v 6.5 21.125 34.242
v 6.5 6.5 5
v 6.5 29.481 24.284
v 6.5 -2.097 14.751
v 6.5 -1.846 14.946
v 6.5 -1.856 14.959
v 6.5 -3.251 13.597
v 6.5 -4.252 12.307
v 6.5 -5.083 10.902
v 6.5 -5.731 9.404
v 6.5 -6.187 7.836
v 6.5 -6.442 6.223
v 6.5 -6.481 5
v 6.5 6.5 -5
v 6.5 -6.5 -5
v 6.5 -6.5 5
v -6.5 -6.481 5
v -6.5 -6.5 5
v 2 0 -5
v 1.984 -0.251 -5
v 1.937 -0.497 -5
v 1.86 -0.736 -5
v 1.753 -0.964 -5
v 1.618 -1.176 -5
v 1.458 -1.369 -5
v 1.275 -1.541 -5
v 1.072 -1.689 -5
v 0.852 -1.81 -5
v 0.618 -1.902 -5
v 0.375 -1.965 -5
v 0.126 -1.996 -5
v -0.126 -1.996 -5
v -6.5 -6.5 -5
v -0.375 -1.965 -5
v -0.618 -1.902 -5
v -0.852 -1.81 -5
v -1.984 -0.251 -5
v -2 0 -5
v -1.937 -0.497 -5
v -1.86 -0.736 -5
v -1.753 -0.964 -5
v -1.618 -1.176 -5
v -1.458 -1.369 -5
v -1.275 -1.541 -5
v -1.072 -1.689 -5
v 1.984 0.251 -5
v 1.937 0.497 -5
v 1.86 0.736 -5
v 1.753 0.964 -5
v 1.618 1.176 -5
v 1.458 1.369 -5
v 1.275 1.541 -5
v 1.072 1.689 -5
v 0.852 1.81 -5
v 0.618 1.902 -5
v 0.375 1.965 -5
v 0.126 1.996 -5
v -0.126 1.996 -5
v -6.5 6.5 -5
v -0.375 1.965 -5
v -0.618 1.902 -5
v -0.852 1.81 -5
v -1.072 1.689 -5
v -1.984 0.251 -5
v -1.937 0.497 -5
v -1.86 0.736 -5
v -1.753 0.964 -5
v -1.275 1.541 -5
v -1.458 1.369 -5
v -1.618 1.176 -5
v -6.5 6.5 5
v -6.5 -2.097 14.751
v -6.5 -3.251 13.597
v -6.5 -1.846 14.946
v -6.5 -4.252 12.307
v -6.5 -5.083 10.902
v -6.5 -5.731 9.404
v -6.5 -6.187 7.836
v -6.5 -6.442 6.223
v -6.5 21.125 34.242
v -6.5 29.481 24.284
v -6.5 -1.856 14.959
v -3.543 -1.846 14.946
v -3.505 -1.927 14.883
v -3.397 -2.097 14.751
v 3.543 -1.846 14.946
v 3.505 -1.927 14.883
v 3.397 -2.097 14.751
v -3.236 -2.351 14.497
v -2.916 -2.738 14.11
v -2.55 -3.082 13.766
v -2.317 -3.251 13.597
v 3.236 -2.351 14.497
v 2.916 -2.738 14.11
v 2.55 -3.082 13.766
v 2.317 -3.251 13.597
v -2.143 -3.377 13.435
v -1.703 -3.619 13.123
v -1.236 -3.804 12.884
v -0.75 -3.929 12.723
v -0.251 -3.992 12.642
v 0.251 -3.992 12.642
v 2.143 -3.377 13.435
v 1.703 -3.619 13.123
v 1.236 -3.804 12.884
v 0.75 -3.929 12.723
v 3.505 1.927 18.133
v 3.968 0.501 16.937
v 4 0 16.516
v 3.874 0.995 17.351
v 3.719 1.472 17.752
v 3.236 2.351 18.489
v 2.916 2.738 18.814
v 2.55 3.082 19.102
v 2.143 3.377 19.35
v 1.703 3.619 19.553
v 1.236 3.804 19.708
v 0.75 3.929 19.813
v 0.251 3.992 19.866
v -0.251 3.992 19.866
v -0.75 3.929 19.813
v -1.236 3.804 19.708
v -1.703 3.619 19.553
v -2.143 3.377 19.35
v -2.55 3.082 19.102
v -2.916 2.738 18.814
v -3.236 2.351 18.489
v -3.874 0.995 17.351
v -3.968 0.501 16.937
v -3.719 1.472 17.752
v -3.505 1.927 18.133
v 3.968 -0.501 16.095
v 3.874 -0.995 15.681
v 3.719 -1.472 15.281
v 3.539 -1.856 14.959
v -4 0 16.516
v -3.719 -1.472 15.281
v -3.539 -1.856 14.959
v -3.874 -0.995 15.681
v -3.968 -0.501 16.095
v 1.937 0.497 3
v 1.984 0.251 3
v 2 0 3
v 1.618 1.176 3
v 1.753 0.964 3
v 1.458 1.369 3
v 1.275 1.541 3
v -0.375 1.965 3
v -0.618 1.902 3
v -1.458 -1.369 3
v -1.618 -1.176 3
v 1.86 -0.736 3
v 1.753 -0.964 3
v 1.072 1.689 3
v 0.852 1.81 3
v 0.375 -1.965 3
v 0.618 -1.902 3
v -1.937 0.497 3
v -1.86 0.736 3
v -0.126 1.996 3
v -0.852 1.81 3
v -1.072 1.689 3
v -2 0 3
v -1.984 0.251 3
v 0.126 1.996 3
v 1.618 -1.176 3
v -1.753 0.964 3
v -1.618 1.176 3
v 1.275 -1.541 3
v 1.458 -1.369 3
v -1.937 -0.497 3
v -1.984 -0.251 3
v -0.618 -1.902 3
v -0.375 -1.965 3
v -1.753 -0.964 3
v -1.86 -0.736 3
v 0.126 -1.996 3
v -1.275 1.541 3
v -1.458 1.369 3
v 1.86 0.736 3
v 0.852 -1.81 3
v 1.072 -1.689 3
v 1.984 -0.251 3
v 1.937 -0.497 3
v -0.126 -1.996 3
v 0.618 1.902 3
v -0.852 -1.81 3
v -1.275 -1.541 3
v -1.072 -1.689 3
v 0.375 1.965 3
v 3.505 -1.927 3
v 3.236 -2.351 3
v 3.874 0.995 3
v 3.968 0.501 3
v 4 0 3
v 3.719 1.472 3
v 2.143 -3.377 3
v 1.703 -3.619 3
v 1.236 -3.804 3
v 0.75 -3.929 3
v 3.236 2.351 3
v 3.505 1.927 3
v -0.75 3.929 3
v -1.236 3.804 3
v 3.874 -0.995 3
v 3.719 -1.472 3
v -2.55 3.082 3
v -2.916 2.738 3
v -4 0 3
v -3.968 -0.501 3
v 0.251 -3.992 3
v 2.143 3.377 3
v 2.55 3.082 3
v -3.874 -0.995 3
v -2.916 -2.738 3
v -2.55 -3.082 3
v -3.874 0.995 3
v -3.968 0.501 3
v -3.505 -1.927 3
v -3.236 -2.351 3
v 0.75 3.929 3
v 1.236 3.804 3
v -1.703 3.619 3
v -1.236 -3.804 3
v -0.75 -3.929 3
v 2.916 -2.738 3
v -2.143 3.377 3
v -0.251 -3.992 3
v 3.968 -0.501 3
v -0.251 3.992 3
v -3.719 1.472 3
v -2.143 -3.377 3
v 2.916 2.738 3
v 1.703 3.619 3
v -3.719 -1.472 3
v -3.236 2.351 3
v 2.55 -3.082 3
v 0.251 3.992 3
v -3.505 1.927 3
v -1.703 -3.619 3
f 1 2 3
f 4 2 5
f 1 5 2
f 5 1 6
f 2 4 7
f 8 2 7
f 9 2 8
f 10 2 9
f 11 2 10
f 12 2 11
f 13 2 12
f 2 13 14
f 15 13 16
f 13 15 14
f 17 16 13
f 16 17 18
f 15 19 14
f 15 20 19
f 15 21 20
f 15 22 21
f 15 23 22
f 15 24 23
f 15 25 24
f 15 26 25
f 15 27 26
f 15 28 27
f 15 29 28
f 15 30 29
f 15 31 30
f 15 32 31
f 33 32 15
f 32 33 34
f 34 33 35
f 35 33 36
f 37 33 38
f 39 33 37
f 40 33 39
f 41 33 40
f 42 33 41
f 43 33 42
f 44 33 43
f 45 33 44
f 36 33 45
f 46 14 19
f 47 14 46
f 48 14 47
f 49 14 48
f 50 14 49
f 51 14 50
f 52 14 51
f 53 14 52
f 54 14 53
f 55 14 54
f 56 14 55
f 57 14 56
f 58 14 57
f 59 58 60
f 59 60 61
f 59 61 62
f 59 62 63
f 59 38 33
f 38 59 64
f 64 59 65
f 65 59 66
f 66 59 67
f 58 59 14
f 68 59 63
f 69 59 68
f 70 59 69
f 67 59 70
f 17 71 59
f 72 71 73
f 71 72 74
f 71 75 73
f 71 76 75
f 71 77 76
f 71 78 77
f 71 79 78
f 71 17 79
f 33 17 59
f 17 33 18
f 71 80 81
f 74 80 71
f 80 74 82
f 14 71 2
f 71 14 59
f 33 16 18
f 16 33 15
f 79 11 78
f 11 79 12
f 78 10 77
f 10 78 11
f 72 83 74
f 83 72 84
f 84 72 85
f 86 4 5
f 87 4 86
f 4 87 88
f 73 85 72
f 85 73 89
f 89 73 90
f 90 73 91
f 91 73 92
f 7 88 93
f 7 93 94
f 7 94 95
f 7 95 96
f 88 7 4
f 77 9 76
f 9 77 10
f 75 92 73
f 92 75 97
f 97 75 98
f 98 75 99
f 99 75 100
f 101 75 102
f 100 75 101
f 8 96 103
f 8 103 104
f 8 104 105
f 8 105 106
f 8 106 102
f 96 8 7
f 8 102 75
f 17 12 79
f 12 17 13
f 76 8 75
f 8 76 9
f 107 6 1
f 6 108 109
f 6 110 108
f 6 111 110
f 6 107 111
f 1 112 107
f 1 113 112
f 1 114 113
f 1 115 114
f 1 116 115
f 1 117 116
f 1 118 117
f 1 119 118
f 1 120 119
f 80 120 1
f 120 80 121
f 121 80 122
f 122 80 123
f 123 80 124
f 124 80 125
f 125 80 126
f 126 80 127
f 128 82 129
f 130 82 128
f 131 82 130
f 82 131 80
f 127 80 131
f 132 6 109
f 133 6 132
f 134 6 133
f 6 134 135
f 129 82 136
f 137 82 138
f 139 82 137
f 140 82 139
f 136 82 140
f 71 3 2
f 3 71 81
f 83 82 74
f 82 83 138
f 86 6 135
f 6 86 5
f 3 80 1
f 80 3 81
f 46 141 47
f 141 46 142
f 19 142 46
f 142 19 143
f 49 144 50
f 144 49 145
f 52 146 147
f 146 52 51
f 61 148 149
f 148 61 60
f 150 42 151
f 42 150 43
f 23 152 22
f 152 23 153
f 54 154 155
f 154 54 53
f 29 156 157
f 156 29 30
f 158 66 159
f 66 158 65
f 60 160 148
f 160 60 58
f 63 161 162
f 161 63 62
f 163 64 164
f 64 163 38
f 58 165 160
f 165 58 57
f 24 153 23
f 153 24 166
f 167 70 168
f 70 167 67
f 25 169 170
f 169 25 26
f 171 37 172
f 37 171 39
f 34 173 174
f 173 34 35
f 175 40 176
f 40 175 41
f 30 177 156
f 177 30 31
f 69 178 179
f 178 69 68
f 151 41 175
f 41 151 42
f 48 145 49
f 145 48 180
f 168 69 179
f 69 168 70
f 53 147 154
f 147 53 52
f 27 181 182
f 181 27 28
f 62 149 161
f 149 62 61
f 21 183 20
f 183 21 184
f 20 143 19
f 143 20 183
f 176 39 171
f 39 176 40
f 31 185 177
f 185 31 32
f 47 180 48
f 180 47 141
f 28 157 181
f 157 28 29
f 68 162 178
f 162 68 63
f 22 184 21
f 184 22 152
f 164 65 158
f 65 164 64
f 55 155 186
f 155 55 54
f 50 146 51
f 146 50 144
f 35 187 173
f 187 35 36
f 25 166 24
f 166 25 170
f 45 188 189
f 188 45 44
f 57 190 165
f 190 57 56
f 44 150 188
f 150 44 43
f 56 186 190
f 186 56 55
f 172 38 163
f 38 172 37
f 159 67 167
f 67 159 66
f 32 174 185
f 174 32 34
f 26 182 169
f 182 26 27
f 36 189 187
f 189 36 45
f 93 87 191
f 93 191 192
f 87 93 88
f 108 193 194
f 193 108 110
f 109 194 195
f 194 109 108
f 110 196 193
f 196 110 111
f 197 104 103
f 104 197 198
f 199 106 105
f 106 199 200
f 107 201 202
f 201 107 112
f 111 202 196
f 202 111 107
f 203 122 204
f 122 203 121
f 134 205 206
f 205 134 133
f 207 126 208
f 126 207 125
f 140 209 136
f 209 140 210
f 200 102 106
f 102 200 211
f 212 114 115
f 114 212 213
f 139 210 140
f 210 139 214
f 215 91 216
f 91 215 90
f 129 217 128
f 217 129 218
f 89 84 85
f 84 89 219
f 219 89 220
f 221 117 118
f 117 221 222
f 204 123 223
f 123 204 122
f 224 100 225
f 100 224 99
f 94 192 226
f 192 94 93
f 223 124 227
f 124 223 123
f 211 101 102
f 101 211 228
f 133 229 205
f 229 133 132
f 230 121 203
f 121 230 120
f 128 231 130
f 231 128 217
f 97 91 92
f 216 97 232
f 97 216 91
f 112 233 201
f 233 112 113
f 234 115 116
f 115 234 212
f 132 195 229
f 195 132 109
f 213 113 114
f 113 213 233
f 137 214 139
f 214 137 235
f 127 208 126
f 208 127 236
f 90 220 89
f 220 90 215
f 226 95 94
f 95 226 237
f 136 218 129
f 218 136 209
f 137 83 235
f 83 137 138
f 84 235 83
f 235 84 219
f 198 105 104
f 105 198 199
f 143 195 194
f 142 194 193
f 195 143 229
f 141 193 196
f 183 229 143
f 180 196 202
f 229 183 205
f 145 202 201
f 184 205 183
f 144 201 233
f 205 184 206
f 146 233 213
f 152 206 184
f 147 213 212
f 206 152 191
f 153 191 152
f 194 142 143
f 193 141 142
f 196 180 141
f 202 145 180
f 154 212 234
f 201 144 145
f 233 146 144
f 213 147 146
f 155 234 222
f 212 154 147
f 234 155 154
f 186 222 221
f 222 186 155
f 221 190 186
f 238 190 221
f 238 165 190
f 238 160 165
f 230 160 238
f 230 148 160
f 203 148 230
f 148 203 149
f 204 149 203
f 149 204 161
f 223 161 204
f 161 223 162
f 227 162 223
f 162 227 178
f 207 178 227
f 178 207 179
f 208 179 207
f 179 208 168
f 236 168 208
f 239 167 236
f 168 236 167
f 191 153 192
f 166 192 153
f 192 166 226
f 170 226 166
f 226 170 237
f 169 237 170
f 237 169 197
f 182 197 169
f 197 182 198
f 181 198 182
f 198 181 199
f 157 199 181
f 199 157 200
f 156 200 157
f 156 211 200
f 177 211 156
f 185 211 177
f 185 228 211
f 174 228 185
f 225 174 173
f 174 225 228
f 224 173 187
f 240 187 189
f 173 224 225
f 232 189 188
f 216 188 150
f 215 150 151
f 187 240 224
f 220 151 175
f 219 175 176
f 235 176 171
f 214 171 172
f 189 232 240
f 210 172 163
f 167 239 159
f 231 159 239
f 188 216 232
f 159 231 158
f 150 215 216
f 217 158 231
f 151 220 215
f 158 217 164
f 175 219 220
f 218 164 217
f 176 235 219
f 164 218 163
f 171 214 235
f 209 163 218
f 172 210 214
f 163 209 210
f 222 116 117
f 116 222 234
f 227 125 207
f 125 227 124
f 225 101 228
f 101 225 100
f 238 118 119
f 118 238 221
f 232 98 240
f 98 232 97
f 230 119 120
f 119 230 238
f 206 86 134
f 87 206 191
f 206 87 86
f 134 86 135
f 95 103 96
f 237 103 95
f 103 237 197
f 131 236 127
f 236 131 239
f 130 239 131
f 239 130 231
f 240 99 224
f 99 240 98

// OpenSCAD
// 20150520 (c) Ewald Beekman
// this is the design for a clip to hold the lid of a pan on the inside of cupboard doors
// the design is parametric so it can be easily adjusted to any lid (or whatever you want to do with it)
//
// the design is made of three pieces, a base cube, a "piece of pie" and and a beam
// and two cylinders which make up for the recessed hole where the screw goes.
//
// the three pieces are in different colours so you can see what happens if you change the parameters

// the arc library is now included in this code so we can use customizer in Thingiverse
// use <arc.scad>
// arc.scad contains to functions:
// 2D_arc(w=thickness_of_arc, r=radius_of_arc, deg=degrees_of_arc_angle, fn=resolution);
// 3D_arc(w=thickness_of_arc, r=radius_of_arc, deg=degrees_of_arc_angle, fn=resolution, h=height_of_arc);

$fn=5*10;   // by using a multiply here, it won't show up in customizer

// size of the base, this is the base yellow brick
base_size=13;   //[3:30]

// the height of the yellow base brick
base_height=10; //[0:100]

// what diameter mounting screws are you going to use
mounting_hole=4;    //[2:10]

// what's the diameter of the screw head
screw_head=8;   //[2:16]

// how much length for the screw to grab om before it reaches the cupboard
keep=8; // [2:20]

//length of the part which angles away from the base
beam_length=30; //[0:100]

// thickness of the angled part is the same as the base size
beam_thickness=base_size;

// what's the angle you want, 0 means a square angle
angle=40;   //[0:90]

module beam() {
color("Green")
    translate([-base_size/2,base_size/2,base_height/2]) 
        rotate([angle,0,0]) 
            cube(size=[base_size,beam_length,beam_thickness]);
}
module pie() {
color("Red")
    translate([-(base_size/2),base_size/2,base_height/2])
        rotate([135,0,0])
            rotate([0,90,0])  //have to use 2x rotate because we need first y (this one), and then x
                3D_arc(w=base_size*2,r=0,deg=90,fn=50,h=base_size);
}

module brick() {
color("Yellow")
    cube(size=[base_size,base_size,base_height],center=true);   // this is our base block
}
    
// "drill" the two holes in the base cube
difference() {
//union(){         // for debug, if you uncomment this, and comment out "difference", cube and pie, you can see the cylinders
    union() {
       brick();
       pie();
       beam();
       }
       
// the is the hole for the screw      
    cylinder(h=base_size*2, r=mounting_hole/2, center=true);
 
// and this the one for the screw head       
// keep has to be subtracted with half base_height because the cube is positioned with center=true, so it floats on the x/y plane
    translate([0,0,keep - (base_height/2)])     
        cylinder(h=base_size*2, r=screw_head/2 );
}

/*
Plot a 2D or 3D arc from 0.1 to ~358 degrees.

Set Width of drawn arc, Radius, Thickness, resolution ($fn) and height for the 3D arc. Arc is centered around the origin

By tony@think3dprint3d.com
GPLv3

*/

module 2D_arc(w, r, deg=90,fn = 100 ) {
        render() {
                difference() {
                        // outer circle
                        circle(r=r+w/2,center=true,$fn=fn);
                        // outer circle
                        circle(r=r-w/2,center=true,$fn=fn);

                //remove the areas not covered by the arc
                translate([sin(90-deg/2)*((r+w/2)*2),
                                                -sin(deg/2)*((r+w/2)*2)])
                        rotate([0,0,90-deg/2])
                                translate([((r+w/2))-sin(90-(deg)/4)*((r+w/2)),
                                                        ((r+w/2))*2-sin(90-(deg)/4)*((r+w/2))])
                                        square([sin(90-deg/4)*((r+w/2)*2),
                                                                sin(90-deg/4)*((r+w/2)*2)],center=true);
                translate([-sin(90-(deg)/2)*((r+w/2)*2),
                                                -sin(deg/2)*((r+w/2)*2)])
                        rotate([0,0,-(90-deg/2)])
                          translate([-((r+w/2))+sin(90-(deg)/4)*((r+w/2)),
                                                        ((r+w/2))*2-sin(90-(deg)/4)*((r+w/2))])
                                        square([sin(90-deg/4)*((r+w/2)*2),
                                                                sin(90-deg/4)*((r+w/2)*2)],center=true);
                }
                //line to see the arc
                //#translate([-((r)*2)/2, sin((180-deg)/2)*(r)]) square([(r+w/2)*2+1,0.01]);
        }
}

module 3D_arc(w, r, deg, h,fn) {
        linear_extrude(h)
                        2D_arc(w, r, deg,fn);

}
